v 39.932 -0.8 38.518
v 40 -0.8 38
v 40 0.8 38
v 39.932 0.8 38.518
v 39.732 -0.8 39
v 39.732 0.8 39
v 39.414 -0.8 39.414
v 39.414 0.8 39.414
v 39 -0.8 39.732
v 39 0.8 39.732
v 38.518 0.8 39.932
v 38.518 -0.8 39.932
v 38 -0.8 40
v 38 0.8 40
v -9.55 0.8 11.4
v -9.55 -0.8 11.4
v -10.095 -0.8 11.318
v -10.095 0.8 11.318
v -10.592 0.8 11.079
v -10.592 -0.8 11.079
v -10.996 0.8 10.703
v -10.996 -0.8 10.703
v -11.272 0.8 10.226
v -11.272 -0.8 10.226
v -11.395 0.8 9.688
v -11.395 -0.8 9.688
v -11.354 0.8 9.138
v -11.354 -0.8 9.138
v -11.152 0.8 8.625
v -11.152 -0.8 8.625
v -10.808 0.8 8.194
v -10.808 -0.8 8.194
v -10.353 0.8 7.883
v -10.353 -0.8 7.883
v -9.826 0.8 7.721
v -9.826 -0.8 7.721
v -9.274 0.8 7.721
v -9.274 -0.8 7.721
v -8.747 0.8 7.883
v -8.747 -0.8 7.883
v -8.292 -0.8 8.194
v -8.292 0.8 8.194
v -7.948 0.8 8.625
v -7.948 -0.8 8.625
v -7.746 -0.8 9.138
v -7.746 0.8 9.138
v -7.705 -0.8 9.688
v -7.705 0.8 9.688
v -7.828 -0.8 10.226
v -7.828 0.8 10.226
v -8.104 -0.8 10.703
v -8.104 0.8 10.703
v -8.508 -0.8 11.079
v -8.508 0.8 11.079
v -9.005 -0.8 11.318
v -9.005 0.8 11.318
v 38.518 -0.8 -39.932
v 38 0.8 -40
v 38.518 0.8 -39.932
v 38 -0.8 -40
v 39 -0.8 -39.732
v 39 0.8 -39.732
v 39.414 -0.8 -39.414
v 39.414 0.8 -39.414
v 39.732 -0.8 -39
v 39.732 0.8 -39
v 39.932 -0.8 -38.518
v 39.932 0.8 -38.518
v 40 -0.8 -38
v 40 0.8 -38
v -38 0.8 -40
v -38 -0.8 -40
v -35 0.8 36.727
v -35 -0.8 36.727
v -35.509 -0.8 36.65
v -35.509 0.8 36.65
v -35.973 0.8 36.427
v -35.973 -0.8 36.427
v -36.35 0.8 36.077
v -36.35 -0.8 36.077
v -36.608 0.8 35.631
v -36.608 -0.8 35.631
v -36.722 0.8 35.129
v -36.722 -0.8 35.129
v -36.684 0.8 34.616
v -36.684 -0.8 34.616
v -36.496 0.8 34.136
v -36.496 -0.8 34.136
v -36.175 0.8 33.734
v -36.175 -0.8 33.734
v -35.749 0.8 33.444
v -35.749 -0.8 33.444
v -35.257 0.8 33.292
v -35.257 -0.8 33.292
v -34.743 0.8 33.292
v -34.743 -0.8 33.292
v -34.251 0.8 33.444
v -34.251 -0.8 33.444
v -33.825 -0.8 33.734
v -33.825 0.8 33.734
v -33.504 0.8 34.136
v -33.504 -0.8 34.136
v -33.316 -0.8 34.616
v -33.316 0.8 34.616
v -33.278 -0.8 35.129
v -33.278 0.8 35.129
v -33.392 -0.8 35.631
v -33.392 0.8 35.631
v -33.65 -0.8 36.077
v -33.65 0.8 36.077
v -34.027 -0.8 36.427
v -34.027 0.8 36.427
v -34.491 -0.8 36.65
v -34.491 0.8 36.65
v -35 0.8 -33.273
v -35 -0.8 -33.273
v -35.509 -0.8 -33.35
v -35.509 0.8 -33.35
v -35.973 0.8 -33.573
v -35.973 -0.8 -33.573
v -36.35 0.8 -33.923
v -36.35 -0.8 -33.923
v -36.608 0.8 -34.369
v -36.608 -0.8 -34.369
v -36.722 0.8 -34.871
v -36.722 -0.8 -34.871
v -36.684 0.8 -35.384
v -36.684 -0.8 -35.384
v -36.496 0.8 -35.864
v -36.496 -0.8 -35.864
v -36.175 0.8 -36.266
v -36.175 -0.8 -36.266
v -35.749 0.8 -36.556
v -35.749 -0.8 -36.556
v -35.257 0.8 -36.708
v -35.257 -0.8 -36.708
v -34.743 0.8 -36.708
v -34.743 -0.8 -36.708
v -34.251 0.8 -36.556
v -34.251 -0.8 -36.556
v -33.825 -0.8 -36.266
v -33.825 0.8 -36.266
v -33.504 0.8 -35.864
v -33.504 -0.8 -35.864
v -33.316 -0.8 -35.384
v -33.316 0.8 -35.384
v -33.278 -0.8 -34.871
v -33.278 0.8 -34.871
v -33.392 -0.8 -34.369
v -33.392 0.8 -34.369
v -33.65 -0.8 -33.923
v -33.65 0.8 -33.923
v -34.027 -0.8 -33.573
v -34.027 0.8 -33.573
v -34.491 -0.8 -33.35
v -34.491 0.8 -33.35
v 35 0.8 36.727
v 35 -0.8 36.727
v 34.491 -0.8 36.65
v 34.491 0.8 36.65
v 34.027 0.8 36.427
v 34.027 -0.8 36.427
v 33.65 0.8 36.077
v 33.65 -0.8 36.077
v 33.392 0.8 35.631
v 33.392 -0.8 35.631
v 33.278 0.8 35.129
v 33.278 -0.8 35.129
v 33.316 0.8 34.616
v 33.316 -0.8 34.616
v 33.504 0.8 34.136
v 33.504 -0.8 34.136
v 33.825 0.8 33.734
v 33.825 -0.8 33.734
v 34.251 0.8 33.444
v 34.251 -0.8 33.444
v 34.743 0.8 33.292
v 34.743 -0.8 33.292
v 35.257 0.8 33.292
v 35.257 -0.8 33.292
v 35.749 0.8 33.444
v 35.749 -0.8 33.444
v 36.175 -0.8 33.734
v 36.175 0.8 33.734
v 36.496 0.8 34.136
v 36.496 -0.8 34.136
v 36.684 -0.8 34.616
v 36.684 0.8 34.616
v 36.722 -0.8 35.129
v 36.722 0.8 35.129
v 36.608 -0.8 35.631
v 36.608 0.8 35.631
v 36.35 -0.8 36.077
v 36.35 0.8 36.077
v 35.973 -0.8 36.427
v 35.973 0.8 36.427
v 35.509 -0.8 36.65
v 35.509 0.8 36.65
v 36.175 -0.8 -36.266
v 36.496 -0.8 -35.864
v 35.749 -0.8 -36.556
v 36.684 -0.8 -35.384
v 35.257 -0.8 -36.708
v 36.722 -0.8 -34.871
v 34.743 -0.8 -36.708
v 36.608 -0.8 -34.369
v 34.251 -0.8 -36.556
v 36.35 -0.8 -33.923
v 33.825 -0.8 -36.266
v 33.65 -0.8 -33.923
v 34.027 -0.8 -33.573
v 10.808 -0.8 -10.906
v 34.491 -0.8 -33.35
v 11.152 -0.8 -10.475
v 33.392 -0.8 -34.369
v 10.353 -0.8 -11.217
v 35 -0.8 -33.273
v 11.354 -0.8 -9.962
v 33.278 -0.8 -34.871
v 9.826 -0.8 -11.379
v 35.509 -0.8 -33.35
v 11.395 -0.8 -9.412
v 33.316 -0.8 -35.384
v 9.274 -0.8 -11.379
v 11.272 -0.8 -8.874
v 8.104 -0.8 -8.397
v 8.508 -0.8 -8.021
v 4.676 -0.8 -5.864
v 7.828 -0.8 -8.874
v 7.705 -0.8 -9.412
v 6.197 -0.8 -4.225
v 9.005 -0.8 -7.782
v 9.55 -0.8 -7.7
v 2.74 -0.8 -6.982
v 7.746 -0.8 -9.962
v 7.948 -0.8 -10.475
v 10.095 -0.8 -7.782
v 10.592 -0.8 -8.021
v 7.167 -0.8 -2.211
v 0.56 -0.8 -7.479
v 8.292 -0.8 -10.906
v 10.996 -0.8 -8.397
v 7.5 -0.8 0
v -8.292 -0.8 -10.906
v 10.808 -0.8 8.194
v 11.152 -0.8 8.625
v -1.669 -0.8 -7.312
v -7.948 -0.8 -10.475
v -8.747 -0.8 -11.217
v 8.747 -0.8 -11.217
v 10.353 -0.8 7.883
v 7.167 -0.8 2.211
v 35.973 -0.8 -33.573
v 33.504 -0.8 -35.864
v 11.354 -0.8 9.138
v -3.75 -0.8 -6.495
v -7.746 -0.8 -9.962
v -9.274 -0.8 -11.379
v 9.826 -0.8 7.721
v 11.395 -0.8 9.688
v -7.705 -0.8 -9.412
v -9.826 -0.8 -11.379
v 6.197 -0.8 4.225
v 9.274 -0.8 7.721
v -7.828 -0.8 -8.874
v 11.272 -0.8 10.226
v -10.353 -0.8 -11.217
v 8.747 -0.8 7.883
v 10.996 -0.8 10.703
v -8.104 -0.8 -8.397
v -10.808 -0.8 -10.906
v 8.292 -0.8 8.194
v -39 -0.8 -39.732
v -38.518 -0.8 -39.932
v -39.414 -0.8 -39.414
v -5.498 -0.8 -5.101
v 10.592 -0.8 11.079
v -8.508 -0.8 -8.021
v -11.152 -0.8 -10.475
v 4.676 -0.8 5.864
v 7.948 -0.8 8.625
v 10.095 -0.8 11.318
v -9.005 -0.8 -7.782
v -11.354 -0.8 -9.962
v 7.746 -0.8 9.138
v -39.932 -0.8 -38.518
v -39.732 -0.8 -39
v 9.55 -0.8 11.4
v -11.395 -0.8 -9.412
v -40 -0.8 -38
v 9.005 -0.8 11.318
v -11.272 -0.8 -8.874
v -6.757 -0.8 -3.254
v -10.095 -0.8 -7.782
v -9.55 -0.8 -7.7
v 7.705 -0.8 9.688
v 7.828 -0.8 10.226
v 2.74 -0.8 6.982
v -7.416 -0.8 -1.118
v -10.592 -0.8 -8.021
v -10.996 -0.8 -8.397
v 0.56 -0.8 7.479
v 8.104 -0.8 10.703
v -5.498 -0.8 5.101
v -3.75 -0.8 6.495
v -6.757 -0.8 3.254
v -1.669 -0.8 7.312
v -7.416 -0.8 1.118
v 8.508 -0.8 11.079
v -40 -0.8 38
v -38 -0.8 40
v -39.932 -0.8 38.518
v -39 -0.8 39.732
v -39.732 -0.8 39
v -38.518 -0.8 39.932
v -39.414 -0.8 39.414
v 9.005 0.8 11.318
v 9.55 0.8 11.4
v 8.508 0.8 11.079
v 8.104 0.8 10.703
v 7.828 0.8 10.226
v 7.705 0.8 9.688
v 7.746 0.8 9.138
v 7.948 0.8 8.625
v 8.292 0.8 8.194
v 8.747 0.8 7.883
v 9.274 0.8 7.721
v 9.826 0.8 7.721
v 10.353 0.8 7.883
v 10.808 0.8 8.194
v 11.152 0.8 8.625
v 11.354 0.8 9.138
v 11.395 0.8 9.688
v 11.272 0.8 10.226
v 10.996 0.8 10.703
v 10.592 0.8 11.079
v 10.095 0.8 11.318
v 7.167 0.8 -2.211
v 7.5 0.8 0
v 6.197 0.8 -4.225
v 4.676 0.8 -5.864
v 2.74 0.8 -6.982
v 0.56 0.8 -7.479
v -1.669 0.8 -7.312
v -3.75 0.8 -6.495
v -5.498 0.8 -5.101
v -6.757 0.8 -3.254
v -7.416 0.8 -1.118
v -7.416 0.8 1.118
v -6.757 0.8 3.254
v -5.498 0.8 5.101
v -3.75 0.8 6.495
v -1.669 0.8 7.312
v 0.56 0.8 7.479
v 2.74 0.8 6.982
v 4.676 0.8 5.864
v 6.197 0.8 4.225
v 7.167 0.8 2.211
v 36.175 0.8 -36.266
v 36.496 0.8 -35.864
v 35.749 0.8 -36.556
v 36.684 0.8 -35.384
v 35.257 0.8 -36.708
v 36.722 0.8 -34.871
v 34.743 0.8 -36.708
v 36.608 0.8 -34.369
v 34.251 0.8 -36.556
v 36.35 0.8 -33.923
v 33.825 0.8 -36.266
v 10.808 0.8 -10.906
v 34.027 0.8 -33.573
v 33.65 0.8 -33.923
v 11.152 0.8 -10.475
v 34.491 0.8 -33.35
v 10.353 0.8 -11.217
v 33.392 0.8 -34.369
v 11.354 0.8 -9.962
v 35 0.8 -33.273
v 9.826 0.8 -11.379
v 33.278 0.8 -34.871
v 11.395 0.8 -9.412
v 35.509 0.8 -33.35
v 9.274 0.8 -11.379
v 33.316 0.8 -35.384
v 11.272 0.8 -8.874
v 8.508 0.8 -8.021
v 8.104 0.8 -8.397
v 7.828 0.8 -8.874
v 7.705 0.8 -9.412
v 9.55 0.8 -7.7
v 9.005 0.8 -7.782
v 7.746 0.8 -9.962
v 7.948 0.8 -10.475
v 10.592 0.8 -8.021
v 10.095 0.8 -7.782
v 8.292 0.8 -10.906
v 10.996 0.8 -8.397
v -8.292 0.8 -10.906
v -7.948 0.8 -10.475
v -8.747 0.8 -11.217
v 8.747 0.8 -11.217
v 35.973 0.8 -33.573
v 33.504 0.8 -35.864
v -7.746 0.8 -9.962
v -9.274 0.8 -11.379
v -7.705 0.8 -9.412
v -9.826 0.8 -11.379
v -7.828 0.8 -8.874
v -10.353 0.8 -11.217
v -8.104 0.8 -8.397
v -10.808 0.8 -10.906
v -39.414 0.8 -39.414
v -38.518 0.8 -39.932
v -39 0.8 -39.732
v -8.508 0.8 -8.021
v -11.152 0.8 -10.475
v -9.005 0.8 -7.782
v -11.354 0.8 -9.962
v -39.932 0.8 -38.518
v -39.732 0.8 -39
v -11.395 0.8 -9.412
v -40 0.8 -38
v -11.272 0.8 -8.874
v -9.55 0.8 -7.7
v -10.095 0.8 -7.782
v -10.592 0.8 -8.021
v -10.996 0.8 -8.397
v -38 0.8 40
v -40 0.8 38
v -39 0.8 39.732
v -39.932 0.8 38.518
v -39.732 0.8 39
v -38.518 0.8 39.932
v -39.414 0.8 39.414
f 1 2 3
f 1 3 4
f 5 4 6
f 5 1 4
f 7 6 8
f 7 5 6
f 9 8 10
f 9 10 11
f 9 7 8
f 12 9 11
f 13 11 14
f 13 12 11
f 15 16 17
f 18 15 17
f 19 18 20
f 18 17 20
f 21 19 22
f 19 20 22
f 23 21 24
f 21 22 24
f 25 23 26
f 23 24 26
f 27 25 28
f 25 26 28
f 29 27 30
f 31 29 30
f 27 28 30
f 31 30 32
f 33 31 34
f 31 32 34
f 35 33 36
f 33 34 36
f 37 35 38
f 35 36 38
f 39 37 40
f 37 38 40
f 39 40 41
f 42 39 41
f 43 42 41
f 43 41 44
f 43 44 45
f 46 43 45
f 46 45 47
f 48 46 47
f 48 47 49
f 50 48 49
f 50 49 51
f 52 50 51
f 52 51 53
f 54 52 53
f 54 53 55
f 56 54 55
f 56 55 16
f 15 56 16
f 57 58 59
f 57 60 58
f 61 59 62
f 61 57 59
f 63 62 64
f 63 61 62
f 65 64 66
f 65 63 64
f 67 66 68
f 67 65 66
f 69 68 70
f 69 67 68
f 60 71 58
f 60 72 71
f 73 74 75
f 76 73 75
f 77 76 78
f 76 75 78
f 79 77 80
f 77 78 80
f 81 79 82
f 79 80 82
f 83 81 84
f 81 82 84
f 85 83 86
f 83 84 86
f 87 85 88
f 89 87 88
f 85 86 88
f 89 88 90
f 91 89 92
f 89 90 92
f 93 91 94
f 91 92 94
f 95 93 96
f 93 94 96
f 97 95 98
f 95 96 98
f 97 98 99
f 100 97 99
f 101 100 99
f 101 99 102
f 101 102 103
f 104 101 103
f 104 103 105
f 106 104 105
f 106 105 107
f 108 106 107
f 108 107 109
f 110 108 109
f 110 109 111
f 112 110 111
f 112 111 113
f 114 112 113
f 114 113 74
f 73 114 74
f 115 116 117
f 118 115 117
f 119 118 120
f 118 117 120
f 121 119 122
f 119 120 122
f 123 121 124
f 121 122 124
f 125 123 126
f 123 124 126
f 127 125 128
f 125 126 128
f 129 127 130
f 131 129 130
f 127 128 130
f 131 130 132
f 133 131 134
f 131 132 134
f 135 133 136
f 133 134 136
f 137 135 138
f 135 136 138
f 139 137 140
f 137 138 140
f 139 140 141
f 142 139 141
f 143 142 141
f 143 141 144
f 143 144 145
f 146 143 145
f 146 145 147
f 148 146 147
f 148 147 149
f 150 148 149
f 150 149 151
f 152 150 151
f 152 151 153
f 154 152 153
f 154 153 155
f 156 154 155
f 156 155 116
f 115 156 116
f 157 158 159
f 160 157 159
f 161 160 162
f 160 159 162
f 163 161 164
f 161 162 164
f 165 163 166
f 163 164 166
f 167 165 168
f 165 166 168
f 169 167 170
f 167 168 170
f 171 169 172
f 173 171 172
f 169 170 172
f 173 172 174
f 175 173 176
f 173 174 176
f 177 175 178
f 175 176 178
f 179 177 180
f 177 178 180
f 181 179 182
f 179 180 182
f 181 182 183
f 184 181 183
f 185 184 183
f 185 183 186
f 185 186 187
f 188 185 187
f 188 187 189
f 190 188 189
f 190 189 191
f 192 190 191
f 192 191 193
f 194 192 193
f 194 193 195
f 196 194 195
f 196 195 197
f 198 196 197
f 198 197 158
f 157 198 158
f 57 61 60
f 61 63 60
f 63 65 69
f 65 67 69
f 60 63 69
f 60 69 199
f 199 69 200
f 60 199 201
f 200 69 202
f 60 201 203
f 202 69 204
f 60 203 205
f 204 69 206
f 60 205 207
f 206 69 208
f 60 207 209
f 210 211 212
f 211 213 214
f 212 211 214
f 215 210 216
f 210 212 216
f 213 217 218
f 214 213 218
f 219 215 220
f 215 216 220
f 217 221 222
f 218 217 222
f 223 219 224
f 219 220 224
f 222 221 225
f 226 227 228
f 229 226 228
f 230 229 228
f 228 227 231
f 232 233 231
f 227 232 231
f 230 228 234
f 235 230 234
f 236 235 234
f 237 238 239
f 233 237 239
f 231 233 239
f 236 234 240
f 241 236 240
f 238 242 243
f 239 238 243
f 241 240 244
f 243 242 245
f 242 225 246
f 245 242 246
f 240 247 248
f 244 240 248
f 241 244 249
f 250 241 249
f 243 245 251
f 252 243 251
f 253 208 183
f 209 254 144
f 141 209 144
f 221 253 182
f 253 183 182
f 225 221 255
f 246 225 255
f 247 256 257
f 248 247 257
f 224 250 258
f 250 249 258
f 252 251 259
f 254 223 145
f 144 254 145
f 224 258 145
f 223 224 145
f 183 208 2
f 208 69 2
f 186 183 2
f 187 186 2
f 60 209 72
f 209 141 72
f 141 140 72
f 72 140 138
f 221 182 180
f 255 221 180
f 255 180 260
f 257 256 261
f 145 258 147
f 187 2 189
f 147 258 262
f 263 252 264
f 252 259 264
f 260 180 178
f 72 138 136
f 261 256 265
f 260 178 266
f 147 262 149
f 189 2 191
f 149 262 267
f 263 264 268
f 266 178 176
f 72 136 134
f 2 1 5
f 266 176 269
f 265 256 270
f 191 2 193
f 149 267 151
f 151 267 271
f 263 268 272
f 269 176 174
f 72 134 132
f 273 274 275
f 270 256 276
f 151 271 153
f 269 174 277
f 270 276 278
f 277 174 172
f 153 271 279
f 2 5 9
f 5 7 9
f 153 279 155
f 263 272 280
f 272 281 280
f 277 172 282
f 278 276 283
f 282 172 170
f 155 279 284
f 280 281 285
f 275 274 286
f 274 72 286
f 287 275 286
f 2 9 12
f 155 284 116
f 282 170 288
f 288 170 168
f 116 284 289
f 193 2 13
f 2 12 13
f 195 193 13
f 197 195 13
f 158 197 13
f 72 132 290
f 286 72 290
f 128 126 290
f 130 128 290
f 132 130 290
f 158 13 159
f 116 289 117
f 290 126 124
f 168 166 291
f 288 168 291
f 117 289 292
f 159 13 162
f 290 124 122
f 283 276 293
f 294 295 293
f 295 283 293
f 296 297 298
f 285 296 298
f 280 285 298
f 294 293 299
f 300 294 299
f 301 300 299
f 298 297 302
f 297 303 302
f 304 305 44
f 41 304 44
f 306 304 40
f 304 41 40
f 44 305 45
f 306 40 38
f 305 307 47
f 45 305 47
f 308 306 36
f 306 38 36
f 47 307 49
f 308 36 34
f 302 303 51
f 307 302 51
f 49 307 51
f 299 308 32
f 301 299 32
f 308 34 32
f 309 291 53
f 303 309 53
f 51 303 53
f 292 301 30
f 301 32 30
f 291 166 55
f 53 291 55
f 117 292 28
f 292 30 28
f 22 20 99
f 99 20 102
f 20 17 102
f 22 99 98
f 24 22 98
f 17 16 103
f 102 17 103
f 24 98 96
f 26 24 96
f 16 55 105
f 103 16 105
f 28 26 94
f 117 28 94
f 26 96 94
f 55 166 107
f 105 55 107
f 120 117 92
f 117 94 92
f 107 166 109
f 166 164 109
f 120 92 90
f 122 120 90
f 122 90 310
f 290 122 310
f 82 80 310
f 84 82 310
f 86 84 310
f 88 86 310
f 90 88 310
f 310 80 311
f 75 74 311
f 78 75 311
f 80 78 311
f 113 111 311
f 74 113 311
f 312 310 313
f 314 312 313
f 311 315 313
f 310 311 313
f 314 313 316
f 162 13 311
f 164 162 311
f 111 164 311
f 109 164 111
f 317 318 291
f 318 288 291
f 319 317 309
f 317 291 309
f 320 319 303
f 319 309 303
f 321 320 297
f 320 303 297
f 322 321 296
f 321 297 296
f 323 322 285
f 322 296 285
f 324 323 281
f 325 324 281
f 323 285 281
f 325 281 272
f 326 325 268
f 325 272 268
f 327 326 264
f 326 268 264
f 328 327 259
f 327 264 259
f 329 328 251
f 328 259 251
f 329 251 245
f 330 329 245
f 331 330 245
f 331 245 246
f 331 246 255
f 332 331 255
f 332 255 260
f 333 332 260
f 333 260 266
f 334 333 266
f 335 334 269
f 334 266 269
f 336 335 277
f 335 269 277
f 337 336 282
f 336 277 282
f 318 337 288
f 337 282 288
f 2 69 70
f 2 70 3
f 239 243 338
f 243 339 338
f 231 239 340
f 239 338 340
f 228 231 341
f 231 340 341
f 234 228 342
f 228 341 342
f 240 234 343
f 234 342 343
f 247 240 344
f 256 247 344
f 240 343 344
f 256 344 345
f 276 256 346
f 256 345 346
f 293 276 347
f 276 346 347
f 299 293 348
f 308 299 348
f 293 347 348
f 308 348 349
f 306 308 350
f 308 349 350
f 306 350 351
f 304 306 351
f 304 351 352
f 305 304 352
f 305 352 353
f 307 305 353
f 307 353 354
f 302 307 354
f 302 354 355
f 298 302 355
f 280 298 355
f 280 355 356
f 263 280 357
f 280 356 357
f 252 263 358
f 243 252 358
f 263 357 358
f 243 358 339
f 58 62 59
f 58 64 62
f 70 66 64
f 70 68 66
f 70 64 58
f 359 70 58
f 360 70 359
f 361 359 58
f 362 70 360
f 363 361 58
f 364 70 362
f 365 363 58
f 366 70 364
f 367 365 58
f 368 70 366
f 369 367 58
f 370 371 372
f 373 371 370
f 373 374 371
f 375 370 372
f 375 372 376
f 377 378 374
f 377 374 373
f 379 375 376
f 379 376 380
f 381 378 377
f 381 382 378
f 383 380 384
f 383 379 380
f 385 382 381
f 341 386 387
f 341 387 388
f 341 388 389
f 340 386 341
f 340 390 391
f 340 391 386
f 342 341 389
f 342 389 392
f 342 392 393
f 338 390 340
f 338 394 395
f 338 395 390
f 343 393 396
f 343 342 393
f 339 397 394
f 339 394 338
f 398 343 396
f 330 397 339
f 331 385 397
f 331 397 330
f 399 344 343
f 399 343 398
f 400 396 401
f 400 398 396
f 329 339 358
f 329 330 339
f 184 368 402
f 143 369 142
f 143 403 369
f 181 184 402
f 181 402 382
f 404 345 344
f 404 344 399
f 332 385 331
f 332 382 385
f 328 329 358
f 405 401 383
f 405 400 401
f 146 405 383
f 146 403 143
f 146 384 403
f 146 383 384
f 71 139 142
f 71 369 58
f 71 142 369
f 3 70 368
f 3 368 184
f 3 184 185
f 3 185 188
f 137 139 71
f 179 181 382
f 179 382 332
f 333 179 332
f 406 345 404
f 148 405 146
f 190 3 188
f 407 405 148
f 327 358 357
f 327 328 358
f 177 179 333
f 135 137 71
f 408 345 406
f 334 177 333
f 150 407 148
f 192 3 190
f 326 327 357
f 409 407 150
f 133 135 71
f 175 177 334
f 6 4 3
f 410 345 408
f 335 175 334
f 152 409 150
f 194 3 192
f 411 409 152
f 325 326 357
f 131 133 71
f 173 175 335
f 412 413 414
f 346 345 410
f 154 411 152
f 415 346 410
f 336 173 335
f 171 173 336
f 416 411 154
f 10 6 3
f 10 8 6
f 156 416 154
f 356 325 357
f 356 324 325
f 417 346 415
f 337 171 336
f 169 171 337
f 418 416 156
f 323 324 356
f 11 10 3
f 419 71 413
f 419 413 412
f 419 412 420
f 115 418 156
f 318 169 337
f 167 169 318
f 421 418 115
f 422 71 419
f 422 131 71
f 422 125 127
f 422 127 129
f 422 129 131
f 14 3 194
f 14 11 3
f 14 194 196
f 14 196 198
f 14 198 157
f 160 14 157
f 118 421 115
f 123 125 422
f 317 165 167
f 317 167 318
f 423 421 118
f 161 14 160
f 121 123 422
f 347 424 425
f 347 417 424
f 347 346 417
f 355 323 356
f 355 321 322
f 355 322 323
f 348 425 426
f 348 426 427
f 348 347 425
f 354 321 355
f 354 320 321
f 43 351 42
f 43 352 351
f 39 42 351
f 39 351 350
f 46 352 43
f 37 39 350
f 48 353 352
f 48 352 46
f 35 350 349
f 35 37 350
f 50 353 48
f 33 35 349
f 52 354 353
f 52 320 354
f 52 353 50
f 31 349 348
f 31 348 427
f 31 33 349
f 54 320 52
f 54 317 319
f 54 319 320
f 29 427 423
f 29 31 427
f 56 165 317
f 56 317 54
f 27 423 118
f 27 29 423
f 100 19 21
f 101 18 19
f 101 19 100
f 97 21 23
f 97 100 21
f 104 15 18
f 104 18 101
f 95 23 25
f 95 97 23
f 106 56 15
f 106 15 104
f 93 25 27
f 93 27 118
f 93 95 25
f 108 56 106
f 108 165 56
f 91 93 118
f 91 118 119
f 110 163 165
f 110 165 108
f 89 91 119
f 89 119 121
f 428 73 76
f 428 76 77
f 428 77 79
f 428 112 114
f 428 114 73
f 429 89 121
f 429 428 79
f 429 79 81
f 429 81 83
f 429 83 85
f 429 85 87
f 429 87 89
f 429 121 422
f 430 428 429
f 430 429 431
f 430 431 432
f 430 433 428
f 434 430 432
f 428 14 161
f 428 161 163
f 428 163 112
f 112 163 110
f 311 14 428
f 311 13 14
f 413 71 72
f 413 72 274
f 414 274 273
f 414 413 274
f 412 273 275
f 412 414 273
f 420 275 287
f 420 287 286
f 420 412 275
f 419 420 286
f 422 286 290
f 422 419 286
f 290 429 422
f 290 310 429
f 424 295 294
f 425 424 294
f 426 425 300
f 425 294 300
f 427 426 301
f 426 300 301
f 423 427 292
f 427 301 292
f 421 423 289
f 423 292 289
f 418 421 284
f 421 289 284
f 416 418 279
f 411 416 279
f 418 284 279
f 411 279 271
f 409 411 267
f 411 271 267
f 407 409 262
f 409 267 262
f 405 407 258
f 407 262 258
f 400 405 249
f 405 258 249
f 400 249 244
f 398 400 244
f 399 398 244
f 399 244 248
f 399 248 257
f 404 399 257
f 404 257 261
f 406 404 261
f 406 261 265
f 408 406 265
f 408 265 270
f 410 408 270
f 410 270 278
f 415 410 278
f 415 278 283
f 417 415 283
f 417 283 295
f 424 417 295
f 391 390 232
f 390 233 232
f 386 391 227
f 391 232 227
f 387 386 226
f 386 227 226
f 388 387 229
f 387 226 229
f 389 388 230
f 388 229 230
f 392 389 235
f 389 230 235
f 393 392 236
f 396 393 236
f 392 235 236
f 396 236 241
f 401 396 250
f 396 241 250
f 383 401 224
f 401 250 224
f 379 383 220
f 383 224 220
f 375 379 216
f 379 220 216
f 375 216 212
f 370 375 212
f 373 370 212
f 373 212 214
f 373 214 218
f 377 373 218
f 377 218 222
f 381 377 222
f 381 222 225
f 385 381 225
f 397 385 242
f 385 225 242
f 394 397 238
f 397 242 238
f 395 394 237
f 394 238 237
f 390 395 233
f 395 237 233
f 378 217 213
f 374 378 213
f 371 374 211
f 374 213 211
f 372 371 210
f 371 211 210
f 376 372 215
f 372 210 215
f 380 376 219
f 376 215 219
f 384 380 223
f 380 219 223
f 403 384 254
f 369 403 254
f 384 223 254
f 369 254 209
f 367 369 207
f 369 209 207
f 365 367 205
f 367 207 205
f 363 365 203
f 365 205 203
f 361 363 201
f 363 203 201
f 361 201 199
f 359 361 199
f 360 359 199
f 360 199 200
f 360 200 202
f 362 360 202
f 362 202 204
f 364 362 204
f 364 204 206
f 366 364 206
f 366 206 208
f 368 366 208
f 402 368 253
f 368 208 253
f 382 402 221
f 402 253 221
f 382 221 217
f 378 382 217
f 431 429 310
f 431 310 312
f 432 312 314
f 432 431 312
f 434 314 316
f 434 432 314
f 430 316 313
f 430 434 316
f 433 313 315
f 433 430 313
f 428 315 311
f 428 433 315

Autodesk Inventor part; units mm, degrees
ref_plane "YZ Plane" through (0, 0, 0) normal (1, 0, 0) x (0, 1, 0)
ref_plane "XZ Plane" through (0, 0, 0) normal (0, 1, 0) x (-1, 0, 0)
ref_plane "XY Plane" through (0, 0, 0) normal (0, 0, 1) x (1, 0, 0)
sketch "Sketch1" plane through (0, 0, 0) normal (0, 1, 0) x (-1, 0, 0)
  line L0 (40, -40) -> (-40, -40)
  line L1 (-40, -40) -> (-40, 40)
  line L2 (-40, 40) -> (40, 40)
  line L3 (40, 40) -> (40, -40)
  point P0 (0, 0)
  point P1 (0, -40)
  point P2 (-40, 0)
  dimension "d15" = 80
  dimension "d16" = 80
extrude "Extrusion1" add sketch "Sketch1" along normal mid plane 1.6
fillet "Fillet1" radius 2 4 edges at (-40, 0, 40) (40, 0, 40) (40, 0, -40) (-40, 0, -40)
sketch "Sketch2" plane through (0, 0.8, 0) normal (0, 1, 0) x (1, 0, 0)
  line L0 (0, 0) -> (-7.9877, 0) construction
  line L1 (0, 0) -> (0, 5.5351) construction
  point P0 (-35, -35)
  point P1 (-35, 35)
  point P2 (35, -35)
  point P3 (35, 35)
  dimension "d18" = 35
  dimension "d19" = 35
hole "Hole1" at (-35, 0.8, 35) at (-35, 0.8, -35) at (35, 0.8, 35) at (35, 0.8, -35) direction (0, -1, 0) diameter 3.454 end through all clearance for "Flat Head Machine Screw (82)" size "#4" standard "Ansi Unified Screw Threads"
sketch "Sketch3" plane through (0, 0.8, 0) normal (0, 1, 0) x (1, 0, 0)
  line L0 (-12.55, 12.55) -> (12.55, 12.55)
  line L1 (12.55, 12.55) -> (12.55, -12.55)
  line L2 (12.55, -12.55) -> (-12.55, -12.55)
  line L3 (-12.55, -12.55) -> (-12.55, 12.55)
  line L4 (0, 0) -> (0, 3.6765) construction
  line L5 (0, 0) -> (3.2883, 0) construction
  point P0 (12.55, 0)
  point P1 (0, 12.55)
  point P2 (-9.55, 9.55)
  point P3 (9.55, 9.55)
  point P4 (-9.55, -9.55)
  point P5 (9.55, -9.55)
  dimension "d27" = 25.1
  dimension "d28" = 25.1
  dimension "d29" = 3
  dimension "d30" = 3
hole "Hole2" at (-9.55, 0.8, -9.55) at (9.55, 0.8, -9.55) at (-9.55, 0.8, 9.55) at (9.55, 0.8, 9.55) direction (0, -1, 0) diameter 3.7 end through all
sketch "Sketch4" plane through (0, 0.8, 0) normal (0, 1, 0) x (1, 0, 0)
  circle A0 centre (0, 0) radius 7.5
  dimension "d38" = 15
extrude "Extrusion2" cut sketch "Sketch4" against normal through all
properties part number "pcb"
